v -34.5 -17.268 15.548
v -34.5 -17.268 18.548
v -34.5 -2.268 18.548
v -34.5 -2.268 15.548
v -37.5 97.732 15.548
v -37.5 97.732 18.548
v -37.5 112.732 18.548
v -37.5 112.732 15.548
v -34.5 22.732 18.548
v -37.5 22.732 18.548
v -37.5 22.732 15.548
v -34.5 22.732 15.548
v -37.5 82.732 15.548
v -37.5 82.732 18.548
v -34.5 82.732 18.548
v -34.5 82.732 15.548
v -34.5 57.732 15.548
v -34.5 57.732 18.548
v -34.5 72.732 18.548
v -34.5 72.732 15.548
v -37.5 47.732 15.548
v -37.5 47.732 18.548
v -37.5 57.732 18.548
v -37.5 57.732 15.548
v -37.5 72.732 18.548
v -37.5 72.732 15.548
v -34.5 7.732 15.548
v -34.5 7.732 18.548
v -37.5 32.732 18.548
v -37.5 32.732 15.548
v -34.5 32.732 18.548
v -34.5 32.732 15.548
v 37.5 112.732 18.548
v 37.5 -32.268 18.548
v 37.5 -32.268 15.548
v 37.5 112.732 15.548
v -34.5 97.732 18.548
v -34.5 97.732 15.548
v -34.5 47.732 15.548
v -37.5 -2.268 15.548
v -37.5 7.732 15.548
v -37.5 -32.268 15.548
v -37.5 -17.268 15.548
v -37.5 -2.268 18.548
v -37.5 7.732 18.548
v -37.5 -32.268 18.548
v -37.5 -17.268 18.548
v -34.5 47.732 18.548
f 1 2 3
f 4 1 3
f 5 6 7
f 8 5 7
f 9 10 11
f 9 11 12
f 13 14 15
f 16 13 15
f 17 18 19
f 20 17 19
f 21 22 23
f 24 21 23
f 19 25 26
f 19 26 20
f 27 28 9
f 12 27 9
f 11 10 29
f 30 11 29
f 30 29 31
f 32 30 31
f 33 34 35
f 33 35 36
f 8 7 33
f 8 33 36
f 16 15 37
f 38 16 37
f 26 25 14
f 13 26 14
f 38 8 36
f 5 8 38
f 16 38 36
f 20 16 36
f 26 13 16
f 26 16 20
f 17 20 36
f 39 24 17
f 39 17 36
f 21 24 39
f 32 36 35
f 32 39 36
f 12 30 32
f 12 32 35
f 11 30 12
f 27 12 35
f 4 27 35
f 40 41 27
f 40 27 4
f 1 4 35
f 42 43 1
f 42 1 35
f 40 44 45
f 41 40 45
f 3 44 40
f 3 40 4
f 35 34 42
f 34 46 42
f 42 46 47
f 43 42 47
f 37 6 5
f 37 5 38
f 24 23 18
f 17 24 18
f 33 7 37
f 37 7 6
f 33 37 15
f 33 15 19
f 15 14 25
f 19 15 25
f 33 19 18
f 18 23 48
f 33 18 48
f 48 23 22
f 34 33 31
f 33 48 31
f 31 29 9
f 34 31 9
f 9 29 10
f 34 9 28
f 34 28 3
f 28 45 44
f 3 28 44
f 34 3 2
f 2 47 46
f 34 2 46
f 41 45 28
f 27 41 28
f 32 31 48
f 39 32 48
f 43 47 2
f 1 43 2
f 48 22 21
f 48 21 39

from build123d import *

# Parameters (mm, degrees)
F0_W     = 5.3952559829
F0_H     = 21.7885393649
F0_W_2   = 6.4328089356
F0_H_2   = 60.9454013749
F1_DEPTH = 12.5
F3_W     = 25
F3_H     = 62.590439771
F4_DEPTH = 146.2136954069
F5_DEPTH = 25
F6_W     = 3
F6_H     = 15
F6_W_2   = 50
F6_H_2   = 1.2136954069
F7_DEPTH = 3
F8_DEPTH = 25


with BuildPart() as f1:
    # F0 (on Right) → F1 (new body, symmetric)
    with BuildSketch(Plane.YZ):
        with Locations((-29.570158571, 3.008893691)):
            Rectangle(F0_W, F0_H)
        Polygon((113.9459088445, 18.5482017696), (-32.2677865624, 18.5482017696), (-32.2677865624, 13.9031633735), (-26.8725305796, 13.9031633735), (107.5130999088, 13.9031633735), (113.9459088445, 13.9031633735), align=None)
        with Locations((110.7295043766, -16.569537314)):
            Rectangle(F0_W_2, F0_H_2)
    extrude(amount=F1_DEPTH, both=True)

    # F3 (on face) → F4 (cut, through all)
    with BuildSketch(Plane(origin=(0, 113.9459088445, 0), x_dir=(-1, 0, 0), z_dir=(0, 1, 0))):
        with Locations((0, -15.7470181159)):
            Rectangle(F3_W, F3_H)
    extrude(amount=-F4_DEPTH, mode=Mode.SUBTRACT)

    # F5 (add): a face of the model
    f5_faces = [f1.faces().sort_by_distance(p)[0] for p in [
        (-12.5, 40.839061141, 17.0482017696),
    ]]
    extrude(f5_faces, amount=F5_DEPTH)

    # F6 (on face) → F7 (cut, through all)
    with BuildSketch(Plane.XY.offset(18.5482017696)):
        with Locations((-36, -9.7677865624)):
            Rectangle(F6_W, F6_H)
        with Locations((-36, 15.2322134376)):
            Rectangle(F6_W, F6_H)
        with Locations((-36, 40.2322134376)):
            Rectangle(F6_W, F6_H)
        with Locations((-36, 65.2322134376)):
            Rectangle(F6_W, F6_H)
        with Locations((-36, 90.2322134376)):
            Rectangle(F6_W, F6_H)
        with Locations((-12.5, 113.339061141)):
            Rectangle(F6_W_2, F6_H_2)
    extrude(amount=-F7_DEPTH, mode=Mode.SUBTRACT)

    # F8 (add): a face of the model
    f8_faces = [f1.faces().sort_by_distance(p)[0] for p in [
        (12.5, 40.2322134376, 17.0482017696),
    ]]
    extrude(f8_faces, amount=F8_DEPTH)


solid = f1.part
